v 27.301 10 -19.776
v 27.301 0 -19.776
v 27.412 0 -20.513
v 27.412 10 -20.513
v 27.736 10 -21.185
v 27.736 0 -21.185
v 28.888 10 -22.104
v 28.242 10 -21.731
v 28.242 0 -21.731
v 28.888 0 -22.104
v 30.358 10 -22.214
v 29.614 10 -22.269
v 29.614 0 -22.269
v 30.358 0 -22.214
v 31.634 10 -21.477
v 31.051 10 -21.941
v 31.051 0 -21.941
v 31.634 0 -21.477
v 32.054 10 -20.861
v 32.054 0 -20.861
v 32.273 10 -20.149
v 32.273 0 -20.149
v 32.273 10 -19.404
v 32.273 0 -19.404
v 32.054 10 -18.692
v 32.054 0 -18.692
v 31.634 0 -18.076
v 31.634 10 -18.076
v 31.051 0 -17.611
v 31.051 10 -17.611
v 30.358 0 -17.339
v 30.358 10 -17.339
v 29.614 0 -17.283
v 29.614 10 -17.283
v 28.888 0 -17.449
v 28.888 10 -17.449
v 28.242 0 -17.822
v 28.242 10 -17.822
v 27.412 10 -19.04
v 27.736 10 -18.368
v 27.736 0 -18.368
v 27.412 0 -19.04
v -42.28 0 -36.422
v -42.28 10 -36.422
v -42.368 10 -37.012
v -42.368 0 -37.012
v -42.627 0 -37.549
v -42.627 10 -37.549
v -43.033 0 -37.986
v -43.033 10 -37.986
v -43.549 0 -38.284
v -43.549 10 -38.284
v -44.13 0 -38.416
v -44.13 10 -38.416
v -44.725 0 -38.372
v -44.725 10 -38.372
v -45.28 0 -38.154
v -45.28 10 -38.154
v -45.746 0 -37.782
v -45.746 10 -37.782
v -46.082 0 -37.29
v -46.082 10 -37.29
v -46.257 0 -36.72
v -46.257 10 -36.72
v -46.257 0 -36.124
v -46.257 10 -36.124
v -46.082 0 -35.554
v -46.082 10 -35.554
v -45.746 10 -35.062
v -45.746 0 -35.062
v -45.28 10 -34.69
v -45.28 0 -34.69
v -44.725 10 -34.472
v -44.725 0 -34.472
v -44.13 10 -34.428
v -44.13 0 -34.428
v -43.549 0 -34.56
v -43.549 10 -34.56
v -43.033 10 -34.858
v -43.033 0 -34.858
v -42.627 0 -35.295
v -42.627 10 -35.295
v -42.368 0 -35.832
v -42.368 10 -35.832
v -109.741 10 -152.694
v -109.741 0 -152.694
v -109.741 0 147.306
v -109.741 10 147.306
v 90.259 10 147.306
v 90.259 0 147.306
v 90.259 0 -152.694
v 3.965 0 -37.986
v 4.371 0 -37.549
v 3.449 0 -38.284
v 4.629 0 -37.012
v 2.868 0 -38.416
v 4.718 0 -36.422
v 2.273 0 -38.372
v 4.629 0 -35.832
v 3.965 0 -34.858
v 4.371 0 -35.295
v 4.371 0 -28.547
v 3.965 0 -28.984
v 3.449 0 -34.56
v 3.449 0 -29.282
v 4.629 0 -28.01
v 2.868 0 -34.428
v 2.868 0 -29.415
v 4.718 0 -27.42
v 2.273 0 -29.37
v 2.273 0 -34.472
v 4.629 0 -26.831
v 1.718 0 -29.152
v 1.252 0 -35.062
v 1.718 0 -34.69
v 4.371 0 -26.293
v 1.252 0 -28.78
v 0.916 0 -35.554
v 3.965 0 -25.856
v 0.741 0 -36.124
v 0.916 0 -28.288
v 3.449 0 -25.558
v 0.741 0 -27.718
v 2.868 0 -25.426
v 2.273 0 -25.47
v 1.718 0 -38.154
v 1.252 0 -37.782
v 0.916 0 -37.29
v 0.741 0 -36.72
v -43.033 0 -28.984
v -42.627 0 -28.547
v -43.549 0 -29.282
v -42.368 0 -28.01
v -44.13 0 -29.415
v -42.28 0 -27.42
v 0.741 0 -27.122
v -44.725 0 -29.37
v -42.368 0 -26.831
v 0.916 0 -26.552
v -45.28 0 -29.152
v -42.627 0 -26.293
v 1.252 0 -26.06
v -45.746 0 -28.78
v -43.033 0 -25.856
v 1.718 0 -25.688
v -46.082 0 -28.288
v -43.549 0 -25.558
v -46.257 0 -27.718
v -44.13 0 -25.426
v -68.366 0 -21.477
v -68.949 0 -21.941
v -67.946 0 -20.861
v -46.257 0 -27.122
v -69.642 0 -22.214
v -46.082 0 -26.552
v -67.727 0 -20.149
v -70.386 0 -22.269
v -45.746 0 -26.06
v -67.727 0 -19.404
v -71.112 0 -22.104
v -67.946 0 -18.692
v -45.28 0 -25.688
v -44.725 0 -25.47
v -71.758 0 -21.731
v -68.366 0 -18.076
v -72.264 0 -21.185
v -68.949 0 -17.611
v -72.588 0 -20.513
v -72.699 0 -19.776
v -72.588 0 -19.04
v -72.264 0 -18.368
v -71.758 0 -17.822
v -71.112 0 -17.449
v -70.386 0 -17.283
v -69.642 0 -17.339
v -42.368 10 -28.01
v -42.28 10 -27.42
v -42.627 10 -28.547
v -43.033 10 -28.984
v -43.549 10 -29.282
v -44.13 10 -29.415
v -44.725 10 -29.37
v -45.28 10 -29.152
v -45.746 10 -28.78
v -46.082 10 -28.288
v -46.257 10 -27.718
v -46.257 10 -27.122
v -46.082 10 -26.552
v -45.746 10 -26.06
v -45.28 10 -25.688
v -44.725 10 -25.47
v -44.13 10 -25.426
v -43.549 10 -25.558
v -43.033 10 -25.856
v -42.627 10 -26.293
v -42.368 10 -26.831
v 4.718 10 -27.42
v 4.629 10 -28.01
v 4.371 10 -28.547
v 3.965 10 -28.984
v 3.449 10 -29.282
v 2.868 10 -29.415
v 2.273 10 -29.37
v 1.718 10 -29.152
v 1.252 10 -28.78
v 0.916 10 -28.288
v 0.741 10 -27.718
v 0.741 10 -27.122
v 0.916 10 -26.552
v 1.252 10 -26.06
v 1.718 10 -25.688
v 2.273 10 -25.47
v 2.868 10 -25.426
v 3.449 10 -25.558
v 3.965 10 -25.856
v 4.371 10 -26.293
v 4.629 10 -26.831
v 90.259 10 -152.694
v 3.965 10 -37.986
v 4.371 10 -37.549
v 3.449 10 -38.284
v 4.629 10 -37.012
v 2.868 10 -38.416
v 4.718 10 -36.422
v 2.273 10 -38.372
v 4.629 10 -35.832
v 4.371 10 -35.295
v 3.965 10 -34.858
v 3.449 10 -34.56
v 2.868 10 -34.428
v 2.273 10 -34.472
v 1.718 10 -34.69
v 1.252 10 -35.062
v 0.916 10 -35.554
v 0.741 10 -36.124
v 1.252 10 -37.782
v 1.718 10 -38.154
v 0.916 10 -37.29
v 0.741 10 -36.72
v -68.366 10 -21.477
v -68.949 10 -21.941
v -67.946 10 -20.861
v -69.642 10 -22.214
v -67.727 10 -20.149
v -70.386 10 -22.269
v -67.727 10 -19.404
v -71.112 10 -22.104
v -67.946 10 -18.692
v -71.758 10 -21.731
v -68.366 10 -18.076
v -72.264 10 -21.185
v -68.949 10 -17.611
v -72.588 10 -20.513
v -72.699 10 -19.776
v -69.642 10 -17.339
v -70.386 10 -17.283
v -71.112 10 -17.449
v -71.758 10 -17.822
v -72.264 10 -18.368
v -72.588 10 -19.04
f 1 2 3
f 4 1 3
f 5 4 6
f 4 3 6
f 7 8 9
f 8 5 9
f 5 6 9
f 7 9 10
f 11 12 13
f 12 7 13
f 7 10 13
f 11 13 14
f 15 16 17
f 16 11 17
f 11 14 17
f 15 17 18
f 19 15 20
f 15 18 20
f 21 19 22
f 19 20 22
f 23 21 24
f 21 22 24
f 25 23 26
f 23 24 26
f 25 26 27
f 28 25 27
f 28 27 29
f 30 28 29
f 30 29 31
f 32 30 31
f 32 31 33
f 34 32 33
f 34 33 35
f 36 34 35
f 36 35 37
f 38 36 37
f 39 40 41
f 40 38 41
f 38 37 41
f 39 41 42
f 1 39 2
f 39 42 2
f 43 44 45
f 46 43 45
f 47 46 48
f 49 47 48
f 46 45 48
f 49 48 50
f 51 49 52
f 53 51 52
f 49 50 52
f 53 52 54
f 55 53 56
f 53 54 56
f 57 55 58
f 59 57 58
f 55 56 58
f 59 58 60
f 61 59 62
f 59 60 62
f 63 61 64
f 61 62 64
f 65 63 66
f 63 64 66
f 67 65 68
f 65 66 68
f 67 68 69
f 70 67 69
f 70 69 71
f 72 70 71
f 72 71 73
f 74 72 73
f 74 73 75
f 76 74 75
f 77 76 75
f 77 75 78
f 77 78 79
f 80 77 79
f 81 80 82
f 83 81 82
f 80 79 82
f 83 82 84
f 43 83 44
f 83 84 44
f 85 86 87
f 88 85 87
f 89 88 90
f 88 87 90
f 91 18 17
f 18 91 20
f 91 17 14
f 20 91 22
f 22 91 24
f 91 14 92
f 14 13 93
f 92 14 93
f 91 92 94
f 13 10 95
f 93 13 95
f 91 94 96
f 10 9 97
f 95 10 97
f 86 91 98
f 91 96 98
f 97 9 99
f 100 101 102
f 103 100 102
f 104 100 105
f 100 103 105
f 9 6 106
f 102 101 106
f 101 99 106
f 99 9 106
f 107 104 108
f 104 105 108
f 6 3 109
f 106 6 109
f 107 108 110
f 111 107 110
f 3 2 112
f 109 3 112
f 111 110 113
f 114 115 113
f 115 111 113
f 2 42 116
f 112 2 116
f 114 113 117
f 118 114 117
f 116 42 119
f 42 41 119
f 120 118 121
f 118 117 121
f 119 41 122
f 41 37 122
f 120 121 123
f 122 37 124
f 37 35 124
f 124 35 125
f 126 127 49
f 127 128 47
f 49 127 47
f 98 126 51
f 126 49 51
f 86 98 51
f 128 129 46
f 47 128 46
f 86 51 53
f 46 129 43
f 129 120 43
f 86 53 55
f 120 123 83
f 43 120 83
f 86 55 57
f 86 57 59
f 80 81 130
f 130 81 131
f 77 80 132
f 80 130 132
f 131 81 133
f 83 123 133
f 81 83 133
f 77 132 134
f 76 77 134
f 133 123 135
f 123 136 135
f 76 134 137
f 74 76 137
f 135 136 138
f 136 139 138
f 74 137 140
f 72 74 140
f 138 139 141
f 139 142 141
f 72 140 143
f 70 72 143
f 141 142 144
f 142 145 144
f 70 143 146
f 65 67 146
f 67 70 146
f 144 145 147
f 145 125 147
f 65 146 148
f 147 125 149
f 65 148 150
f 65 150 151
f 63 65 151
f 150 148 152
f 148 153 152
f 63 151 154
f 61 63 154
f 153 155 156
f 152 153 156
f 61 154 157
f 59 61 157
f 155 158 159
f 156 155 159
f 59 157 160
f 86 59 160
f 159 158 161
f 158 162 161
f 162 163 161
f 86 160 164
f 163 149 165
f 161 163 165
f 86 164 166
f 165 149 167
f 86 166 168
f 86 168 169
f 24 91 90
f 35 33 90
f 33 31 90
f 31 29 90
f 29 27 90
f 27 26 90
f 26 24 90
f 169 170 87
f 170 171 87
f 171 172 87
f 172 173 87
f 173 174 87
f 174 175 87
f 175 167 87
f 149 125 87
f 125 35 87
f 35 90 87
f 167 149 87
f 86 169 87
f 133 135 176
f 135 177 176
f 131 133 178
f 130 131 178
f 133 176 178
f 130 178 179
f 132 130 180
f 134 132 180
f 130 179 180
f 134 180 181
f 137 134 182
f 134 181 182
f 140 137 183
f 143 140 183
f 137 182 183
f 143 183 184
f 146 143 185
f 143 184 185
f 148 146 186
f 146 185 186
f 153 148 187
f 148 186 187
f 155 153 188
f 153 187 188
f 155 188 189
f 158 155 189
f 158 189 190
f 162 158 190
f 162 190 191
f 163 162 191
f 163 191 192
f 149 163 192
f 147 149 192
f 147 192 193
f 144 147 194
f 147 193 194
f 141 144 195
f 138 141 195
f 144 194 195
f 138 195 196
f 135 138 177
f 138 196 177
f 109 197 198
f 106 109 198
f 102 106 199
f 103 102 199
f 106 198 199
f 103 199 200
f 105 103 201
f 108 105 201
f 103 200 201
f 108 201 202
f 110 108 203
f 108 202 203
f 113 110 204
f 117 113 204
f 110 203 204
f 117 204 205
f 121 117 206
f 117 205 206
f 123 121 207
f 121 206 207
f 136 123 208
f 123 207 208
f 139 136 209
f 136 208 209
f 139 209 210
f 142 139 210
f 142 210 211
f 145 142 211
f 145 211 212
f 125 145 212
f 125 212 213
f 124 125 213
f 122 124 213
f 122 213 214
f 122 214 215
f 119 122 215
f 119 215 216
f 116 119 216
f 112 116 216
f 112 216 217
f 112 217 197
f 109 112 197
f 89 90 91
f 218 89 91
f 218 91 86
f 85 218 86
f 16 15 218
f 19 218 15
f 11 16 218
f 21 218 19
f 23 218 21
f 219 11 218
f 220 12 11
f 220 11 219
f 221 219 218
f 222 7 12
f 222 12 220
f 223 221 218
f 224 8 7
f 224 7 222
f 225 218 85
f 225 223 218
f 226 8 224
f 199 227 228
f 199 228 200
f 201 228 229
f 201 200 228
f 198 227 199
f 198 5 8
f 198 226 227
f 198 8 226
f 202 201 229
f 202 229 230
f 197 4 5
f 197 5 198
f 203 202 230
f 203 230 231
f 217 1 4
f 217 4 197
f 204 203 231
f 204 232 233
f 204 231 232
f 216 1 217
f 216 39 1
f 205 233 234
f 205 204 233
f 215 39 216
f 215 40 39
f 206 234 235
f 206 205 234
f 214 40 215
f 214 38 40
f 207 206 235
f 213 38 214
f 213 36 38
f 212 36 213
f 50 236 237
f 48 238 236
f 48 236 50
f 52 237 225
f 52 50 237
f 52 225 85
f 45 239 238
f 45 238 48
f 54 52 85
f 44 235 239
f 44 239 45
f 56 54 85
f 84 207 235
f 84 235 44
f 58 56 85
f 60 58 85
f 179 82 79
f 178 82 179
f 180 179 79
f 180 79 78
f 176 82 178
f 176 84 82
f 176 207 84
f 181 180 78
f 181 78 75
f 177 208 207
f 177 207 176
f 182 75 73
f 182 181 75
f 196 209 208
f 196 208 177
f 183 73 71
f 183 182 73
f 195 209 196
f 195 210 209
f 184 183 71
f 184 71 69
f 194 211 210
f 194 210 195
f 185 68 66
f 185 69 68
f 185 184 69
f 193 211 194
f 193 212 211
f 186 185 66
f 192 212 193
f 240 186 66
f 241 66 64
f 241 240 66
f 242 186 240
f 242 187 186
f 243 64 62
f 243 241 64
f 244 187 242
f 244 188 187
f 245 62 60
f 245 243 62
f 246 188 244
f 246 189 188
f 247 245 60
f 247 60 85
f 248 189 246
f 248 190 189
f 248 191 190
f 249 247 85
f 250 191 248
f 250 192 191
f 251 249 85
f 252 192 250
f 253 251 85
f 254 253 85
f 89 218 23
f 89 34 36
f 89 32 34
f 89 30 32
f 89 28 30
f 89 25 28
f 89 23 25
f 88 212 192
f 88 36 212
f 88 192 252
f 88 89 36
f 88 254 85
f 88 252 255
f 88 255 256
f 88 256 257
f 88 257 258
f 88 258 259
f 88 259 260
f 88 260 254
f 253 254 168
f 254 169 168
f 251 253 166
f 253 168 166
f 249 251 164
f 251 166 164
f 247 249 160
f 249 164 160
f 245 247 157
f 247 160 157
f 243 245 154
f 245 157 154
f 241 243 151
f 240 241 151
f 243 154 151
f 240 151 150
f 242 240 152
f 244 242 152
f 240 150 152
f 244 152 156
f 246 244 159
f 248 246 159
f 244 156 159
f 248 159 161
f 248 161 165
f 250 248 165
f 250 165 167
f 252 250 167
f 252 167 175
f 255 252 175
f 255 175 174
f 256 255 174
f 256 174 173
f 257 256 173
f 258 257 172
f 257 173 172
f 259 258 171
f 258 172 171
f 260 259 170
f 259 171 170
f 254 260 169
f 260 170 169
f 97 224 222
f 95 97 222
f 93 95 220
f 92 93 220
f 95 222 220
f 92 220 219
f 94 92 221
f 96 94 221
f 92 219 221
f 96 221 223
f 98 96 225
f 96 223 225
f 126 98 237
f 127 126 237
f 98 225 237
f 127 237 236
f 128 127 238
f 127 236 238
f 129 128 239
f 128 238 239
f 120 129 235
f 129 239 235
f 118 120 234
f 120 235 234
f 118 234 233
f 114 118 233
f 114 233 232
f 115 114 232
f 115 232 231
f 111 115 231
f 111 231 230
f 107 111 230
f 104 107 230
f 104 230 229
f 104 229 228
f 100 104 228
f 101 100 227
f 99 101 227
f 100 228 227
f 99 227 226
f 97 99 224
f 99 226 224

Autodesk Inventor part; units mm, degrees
ref_plane "YZ Plane" through (0, 0, 0) normal (1, 0, 0) x (0, 1, 0)
ref_plane "XZ Plane" through (0, 0, 0) normal (0, 1, 0) x (-1, 0, 0)
ref_plane "XY Plane" through (0, 0, 0) normal (0, 0, 1) x (1, 0, 0)
sketch "Sketch1" plane through (0, 0, 0) normal (0, 1, 0) x (-1, 0, 0)
  line L0 (109.7414, 147.3061) -> (-90.2586, 147.3061)
  line L1 (-90.2586, 147.3061) -> (-90.2586, -152.6939)
  line L2 (-90.2586, -152.6939) -> (109.7414, -152.6939)
  line L3 (109.7414, -152.6939) -> (109.7414, 147.3061)
  circle A0 centre (70.1988, -19.7764) radius 2.5
  circle A1 centre (-29.8012, -19.7764) radius 2.5
  line L4 (70.1988, -19.7764) -> (-29.8012, -19.7764)
  point P0 (0, 0)
  dimension "d0" = 200
  dimension "d1" = 300
  dimension "d2" = 5
  dimension "d3" = 5
  dimension "d4" = 100
extrude "Extrusion1" add sketch "Sketch1" along normal blind 10
sketch "Sketch3" plane through (0, 10, 0) normal (0, 1, 0) x (1, 0, 0)
  point P0 (0, 0)
sketch "Sketch4" plane through (0, 10, 0) normal (0, 1, 0) x (1, 0, 0)
  circle A0 centre (-44.2796, 27.4201) radius 2
  circle A1 centre (2.7183, 27.4201) radius 2
  circle A2 centre (-44.2796, 36.422) radius 2
  circle A3 centre (2.7183, 36.422) radius 2
  point P0 (0, 0)
  dimension "d11" = 4
  dimension "d13" = 4
  dimension "d16" = 4
  dimension "d17" = 4
extrude "Extrusion3" cut sketch "Sketch4" against normal blind 10
properties part number "basestand"
